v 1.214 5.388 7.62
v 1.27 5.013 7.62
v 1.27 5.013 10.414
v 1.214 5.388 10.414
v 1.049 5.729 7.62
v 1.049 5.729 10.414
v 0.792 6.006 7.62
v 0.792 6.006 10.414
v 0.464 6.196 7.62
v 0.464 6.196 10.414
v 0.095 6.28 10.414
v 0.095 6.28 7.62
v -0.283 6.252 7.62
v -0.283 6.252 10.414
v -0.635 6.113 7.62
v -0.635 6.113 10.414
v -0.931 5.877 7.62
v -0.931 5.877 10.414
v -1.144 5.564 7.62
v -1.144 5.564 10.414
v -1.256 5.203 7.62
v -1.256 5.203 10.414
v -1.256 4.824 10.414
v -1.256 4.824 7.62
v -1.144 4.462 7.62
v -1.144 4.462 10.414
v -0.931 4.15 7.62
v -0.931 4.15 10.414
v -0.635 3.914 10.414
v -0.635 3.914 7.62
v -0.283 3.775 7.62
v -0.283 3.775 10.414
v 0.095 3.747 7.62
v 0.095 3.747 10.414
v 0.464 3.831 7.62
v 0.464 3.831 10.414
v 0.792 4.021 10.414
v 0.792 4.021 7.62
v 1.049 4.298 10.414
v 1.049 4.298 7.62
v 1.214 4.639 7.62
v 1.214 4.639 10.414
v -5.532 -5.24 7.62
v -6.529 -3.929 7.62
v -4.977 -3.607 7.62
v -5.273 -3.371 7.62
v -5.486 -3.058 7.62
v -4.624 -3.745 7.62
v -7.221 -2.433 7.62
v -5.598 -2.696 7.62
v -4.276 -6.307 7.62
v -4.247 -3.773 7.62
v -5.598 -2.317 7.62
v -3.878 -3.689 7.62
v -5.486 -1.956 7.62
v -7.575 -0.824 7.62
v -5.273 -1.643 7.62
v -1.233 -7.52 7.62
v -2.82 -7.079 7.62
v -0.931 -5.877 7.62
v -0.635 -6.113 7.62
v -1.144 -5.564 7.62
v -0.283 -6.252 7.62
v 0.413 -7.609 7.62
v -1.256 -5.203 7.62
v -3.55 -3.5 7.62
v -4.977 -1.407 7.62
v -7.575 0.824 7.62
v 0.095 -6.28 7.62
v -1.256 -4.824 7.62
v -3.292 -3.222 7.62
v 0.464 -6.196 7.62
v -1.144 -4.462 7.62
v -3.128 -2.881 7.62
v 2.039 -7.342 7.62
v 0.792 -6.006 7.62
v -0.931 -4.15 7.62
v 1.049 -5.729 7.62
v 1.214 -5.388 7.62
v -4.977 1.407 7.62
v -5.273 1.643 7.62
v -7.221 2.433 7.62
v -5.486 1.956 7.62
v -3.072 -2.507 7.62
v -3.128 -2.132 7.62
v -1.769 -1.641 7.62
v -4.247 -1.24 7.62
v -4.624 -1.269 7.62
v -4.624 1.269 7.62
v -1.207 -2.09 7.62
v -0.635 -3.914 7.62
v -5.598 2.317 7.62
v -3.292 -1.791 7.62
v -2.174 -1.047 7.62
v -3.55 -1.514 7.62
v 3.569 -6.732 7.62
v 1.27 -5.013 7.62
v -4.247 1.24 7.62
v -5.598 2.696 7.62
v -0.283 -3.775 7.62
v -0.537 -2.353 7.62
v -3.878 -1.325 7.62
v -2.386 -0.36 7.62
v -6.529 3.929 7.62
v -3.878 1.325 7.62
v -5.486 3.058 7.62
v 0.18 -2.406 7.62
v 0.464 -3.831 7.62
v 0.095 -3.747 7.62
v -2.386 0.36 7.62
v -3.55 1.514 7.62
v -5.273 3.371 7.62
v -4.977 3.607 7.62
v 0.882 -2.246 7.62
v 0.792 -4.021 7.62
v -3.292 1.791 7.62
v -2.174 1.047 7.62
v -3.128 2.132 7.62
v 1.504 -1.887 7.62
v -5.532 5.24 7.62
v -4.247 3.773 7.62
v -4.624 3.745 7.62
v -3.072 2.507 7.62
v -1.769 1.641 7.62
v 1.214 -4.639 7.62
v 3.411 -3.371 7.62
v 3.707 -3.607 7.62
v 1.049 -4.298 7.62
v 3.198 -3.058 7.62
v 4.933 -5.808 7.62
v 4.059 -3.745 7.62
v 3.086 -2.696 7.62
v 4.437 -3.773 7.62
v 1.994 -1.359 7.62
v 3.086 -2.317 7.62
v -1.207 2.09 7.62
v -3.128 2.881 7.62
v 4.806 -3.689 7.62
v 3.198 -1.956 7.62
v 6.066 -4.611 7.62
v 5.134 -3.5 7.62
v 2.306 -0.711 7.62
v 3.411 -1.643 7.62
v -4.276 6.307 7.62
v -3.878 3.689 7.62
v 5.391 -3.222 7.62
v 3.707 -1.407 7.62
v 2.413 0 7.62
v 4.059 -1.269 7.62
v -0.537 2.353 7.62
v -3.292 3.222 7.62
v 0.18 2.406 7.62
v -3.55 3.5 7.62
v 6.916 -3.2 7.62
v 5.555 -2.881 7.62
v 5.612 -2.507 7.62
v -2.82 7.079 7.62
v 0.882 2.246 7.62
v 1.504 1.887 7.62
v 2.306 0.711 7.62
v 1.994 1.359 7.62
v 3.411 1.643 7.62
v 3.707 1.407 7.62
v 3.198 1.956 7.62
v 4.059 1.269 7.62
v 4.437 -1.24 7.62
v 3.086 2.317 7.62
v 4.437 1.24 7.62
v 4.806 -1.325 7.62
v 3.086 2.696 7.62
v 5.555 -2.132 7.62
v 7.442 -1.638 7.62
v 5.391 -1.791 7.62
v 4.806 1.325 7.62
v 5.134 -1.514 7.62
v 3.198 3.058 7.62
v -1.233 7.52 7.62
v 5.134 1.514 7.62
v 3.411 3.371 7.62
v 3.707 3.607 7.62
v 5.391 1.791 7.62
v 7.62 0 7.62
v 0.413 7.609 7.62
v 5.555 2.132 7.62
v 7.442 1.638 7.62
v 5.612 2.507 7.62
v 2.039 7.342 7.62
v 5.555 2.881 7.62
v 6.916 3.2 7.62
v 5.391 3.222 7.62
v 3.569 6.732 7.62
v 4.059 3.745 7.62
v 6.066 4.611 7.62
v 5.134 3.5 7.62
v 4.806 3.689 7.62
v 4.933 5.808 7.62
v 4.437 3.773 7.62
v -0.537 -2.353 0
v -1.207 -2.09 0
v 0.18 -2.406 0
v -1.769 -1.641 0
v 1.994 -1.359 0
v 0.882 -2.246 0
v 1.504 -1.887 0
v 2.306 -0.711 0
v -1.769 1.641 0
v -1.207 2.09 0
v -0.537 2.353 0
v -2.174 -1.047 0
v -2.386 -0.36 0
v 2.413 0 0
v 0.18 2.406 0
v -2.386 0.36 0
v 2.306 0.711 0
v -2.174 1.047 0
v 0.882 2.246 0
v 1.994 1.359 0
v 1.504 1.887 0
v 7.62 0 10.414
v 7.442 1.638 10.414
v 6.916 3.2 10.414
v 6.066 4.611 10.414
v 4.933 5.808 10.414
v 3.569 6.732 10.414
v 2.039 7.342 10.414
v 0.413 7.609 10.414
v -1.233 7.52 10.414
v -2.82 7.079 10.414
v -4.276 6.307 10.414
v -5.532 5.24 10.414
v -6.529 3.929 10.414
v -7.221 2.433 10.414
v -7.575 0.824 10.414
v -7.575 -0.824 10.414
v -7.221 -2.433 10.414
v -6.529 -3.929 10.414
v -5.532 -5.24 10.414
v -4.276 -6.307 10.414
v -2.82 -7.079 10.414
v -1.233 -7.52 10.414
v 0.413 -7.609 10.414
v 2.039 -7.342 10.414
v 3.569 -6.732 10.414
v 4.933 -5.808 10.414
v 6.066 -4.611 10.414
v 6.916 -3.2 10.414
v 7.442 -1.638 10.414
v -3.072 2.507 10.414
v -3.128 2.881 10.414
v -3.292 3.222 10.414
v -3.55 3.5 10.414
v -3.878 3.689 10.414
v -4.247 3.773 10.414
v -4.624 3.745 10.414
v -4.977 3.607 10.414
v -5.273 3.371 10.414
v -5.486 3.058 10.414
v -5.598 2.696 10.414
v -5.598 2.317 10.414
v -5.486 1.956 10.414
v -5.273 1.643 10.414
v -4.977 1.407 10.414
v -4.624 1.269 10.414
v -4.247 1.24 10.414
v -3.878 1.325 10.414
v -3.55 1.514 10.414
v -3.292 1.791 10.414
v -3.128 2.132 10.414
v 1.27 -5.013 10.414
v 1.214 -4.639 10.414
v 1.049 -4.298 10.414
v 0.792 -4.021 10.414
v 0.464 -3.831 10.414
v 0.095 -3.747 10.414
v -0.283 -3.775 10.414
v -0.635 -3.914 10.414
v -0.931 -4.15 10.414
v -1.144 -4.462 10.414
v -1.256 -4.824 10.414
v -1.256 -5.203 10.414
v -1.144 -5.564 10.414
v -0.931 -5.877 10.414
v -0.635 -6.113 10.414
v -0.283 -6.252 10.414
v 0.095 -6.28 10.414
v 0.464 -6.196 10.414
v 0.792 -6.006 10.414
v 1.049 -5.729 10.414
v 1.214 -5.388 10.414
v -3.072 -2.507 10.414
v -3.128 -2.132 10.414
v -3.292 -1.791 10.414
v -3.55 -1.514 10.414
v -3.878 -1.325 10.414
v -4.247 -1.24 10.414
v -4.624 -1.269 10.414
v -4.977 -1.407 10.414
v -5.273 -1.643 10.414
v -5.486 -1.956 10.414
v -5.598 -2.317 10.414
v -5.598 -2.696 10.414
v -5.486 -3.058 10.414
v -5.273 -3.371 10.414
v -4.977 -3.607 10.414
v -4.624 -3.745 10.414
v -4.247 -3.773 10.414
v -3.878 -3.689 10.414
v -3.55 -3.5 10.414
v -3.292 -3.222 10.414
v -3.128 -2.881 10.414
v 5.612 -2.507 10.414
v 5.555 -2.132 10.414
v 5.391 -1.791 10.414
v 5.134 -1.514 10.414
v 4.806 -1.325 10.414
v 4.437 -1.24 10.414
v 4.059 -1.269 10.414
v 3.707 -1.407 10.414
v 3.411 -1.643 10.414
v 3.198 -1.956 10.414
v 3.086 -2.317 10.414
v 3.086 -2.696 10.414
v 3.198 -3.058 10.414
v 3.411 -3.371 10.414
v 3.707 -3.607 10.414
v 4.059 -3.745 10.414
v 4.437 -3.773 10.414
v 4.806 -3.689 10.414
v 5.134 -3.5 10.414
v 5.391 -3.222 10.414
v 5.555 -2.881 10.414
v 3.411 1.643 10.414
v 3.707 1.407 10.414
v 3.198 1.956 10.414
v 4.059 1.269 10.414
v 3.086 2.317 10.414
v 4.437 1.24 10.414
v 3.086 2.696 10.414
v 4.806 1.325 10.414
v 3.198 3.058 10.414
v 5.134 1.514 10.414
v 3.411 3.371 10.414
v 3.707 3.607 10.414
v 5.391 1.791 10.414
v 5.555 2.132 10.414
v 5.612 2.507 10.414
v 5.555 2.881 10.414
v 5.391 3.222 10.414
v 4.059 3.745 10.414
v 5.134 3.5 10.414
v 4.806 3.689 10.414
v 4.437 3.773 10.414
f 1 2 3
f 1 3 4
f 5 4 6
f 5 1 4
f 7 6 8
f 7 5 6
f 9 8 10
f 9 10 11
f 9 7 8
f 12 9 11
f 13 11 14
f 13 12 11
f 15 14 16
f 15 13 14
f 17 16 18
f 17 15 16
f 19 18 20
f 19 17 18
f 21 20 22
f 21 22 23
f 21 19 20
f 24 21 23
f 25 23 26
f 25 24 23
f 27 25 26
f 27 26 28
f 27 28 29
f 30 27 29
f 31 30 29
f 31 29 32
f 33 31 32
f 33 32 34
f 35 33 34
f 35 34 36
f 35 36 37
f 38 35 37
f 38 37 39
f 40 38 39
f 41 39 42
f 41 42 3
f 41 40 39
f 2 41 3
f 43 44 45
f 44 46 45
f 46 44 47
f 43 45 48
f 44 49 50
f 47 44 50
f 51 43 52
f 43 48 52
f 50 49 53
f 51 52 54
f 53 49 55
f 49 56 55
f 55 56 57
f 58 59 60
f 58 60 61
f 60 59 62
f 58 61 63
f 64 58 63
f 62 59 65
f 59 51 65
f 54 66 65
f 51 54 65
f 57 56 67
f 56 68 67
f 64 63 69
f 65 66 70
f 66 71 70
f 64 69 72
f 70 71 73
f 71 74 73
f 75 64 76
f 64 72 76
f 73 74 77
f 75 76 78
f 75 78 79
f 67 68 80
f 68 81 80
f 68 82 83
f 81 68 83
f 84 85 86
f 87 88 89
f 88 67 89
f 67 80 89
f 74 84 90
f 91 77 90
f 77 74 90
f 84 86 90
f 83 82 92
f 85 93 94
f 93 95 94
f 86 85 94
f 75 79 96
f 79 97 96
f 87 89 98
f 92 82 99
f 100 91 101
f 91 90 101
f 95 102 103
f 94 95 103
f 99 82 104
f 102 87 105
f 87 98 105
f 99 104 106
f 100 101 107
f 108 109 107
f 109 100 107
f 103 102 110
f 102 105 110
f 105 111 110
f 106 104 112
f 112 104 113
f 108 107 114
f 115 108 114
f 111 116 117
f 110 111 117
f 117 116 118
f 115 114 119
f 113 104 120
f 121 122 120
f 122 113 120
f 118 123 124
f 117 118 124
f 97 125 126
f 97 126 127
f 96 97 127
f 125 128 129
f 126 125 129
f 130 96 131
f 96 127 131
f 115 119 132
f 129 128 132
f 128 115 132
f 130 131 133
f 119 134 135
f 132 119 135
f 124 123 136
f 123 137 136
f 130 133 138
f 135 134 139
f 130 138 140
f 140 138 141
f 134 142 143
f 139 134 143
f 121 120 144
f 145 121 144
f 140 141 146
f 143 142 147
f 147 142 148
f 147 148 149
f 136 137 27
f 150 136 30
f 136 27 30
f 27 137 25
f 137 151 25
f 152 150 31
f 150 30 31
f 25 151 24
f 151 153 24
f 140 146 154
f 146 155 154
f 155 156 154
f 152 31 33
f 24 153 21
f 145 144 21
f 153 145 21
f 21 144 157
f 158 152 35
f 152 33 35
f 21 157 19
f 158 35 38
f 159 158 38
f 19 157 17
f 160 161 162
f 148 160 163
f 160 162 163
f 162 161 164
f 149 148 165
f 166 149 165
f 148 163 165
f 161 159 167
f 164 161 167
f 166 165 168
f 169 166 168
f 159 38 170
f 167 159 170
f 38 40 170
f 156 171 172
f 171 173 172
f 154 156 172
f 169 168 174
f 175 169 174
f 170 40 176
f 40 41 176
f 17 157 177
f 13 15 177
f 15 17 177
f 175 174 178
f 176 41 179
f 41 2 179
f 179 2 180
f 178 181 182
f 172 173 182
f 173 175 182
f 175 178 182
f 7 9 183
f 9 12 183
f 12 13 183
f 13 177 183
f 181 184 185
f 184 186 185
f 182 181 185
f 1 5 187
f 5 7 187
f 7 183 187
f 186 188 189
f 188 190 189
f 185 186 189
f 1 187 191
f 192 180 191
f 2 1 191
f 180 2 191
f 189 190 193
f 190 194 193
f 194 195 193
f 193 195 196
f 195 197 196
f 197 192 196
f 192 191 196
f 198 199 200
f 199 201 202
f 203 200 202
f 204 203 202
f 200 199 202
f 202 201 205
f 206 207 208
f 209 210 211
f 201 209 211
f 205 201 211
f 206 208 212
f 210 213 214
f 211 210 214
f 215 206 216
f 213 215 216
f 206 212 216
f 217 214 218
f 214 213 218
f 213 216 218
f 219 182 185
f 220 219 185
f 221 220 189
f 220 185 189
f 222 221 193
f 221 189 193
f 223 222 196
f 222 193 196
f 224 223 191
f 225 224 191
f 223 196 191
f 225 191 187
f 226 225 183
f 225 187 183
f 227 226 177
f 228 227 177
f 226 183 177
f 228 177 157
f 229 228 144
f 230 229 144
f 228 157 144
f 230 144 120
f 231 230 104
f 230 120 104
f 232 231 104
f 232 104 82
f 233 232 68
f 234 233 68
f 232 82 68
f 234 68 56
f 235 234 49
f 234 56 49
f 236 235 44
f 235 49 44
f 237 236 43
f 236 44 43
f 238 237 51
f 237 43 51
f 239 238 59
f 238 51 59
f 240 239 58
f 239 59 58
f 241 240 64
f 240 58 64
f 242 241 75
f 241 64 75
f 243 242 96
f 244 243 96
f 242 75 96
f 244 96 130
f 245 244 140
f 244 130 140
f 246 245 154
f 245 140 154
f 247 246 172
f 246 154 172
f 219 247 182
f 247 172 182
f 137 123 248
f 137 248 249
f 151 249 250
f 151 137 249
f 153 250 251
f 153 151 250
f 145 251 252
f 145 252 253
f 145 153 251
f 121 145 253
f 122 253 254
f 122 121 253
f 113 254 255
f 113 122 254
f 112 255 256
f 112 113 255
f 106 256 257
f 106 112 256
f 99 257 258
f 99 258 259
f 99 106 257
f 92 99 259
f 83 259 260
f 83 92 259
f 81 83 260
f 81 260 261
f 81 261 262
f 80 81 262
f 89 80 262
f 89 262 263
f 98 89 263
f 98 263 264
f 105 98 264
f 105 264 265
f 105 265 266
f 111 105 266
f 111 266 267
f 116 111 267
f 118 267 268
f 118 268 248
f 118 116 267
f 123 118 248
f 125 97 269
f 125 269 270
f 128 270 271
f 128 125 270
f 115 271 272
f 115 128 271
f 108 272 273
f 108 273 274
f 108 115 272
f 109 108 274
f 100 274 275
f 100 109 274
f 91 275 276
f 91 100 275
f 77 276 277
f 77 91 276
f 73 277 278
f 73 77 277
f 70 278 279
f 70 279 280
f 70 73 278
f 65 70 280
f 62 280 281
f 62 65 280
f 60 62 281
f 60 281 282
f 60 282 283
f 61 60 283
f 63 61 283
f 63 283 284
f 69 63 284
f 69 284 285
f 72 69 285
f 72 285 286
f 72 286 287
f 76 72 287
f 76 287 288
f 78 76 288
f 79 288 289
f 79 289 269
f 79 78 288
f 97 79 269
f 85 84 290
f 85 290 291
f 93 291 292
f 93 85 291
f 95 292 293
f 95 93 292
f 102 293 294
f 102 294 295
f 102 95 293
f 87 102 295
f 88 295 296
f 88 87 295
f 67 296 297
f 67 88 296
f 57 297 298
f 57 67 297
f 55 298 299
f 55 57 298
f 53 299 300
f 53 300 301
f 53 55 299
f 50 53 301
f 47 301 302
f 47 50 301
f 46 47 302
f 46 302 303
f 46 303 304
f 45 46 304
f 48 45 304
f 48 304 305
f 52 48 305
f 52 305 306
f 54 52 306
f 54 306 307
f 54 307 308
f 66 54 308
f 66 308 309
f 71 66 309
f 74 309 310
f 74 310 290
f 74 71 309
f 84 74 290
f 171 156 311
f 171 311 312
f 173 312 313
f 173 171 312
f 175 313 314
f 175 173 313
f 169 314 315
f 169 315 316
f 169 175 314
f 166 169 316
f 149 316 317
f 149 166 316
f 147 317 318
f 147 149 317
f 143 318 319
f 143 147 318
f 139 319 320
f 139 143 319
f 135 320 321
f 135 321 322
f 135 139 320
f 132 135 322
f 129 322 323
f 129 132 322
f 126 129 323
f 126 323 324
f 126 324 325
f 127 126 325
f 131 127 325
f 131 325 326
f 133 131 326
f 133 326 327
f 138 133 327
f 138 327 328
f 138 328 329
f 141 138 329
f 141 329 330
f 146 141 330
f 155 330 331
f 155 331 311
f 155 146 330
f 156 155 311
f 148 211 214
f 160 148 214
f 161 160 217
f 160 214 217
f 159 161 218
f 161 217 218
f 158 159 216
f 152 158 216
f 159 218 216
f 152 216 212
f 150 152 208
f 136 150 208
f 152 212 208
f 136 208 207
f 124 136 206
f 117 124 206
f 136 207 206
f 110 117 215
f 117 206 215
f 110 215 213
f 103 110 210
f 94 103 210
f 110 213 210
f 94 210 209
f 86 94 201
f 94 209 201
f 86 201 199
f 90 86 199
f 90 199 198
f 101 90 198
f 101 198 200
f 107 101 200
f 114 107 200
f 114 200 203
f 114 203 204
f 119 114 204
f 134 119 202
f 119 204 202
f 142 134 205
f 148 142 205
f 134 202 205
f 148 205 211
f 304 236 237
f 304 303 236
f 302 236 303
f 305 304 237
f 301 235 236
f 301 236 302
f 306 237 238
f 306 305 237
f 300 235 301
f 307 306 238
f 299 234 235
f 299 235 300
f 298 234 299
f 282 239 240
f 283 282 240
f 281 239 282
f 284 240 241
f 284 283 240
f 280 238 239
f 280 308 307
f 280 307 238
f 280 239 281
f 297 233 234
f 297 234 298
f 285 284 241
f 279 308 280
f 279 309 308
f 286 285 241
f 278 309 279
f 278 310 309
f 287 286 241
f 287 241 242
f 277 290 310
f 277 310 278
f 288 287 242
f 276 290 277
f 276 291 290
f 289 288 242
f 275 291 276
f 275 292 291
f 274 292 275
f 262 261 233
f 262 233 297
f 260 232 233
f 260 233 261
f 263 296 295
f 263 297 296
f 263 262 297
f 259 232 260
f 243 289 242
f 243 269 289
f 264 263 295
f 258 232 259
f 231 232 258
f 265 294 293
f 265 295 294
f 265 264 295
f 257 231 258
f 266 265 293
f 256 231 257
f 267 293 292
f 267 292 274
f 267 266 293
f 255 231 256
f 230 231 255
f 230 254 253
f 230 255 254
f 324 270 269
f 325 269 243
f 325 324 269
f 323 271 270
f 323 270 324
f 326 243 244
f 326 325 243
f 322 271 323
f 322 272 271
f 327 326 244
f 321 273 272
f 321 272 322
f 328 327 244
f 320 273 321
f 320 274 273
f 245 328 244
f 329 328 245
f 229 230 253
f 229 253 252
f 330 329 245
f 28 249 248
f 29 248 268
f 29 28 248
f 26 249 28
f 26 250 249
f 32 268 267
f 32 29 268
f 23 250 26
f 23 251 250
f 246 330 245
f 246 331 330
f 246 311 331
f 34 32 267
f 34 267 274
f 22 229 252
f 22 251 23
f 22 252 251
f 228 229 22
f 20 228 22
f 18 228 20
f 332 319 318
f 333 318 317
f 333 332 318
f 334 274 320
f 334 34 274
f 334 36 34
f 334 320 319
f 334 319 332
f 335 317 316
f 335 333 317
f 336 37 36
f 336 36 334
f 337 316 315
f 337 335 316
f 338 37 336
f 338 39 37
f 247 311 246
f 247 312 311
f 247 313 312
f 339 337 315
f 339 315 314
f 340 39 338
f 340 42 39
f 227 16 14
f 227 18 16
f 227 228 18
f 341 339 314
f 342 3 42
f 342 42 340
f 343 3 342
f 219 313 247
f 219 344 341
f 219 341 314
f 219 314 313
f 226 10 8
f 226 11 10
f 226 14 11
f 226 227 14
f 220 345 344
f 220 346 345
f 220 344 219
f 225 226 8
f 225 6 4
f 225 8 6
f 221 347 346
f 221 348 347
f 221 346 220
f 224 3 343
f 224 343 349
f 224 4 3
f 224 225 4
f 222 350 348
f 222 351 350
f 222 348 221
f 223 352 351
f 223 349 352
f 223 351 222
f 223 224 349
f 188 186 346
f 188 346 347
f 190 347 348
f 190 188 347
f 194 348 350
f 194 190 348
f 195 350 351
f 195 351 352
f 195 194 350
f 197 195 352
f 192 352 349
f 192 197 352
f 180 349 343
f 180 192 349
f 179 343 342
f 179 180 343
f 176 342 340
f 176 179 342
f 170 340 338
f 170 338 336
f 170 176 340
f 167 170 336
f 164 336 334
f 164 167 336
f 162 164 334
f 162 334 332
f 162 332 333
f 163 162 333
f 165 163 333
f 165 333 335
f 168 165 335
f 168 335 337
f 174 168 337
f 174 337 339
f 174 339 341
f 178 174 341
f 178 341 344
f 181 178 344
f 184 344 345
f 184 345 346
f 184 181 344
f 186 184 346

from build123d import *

# Parameters (mm, degrees)
F0_R     = 2.413
F1_DEPTH = 7.62
F2_R     = 7.62
F2_R_2   = 1.27
F3_DEPTH = 2.794


with BuildPart() as f1:
    # F0 (on Top) → F1 (new body)
    with BuildSketch(Plane.XY):
        Circle(F0_R)
    extrude(amount=F1_DEPTH)

    # F2 (on face) → F3 (join)
    with BuildSketch(Plane.XY.offset(7.62)):
        Circle(F2_R)
        with Locations((-4.341766, -2.50672)):
            Circle(F2_R_2, mode=Mode.SUBTRACT)
        with Locations((0, -5.013439)):
            Circle(F2_R_2, mode=Mode.SUBTRACT)
        with Locations((4.341766, -2.50672)):
            Circle(F2_R_2, mode=Mode.SUBTRACT)
        with Locations((-4.341766, 2.50672)):
            Circle(F2_R_2, mode=Mode.SUBTRACT)
        with Locations((4.341766, 2.50672)):
            Circle(F2_R_2, mode=Mode.SUBTRACT)
        with Locations((0, 5.013439)):
            Circle(F2_R_2, mode=Mode.SUBTRACT)
    extrude(amount=F3_DEPTH)


solid = f1.part
